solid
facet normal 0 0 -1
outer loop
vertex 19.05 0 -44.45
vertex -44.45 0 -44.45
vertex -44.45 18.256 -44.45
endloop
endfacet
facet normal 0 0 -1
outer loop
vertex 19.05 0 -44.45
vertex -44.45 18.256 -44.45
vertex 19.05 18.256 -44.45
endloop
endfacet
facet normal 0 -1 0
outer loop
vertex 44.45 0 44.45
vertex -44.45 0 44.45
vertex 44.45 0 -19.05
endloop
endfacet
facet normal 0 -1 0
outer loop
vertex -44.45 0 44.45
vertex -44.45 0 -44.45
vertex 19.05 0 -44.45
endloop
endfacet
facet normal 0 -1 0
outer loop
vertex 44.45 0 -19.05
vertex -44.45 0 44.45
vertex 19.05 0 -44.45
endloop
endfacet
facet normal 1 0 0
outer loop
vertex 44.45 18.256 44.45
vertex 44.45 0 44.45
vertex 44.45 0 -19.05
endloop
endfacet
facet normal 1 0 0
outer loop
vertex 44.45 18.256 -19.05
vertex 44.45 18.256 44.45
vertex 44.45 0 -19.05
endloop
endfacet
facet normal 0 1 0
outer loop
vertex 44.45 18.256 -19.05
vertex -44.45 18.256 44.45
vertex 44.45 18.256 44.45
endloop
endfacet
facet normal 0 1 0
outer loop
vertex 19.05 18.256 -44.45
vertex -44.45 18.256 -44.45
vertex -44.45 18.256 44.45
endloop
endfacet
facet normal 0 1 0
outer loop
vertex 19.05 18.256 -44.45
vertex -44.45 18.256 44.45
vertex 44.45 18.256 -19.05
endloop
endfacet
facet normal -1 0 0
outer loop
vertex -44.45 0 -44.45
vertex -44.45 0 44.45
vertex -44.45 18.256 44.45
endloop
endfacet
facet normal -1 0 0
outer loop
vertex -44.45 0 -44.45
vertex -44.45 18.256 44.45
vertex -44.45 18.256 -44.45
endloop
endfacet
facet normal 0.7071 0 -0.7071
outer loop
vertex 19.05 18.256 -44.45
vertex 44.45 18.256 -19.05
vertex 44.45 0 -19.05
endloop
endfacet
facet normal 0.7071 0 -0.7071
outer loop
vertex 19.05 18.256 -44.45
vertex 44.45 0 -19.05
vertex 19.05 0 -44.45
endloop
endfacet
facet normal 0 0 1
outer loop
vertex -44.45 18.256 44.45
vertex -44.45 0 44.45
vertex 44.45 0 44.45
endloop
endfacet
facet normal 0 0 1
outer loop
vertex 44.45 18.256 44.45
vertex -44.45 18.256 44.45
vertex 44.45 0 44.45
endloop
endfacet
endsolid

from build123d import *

# Parameters (mm, degrees)
SKETCH1_W           = 88.9
SKETCH1_H           = 88.9
BOSS_EXTRUDE1_DEPTH = 18.25625
CUT_EXTRUDE1_DEPTH  = 66.459114446


with BuildPart() as part:
    # Sketch1 → Boss-Extrude1 (new body)
    with BuildSketch(Plane(origin=(0, 0, 0), x_dir=(1, 0, 0), z_dir=(0, 1, 0))):
        Rectangle(SKETCH1_W, SKETCH1_H)
    extrude(amount=BOSS_EXTRUDE1_DEPTH)

    # Sketch2 → Cut-Extrude1 (cut, through all)
    with BuildSketch(Plane(origin=(0, 18.25625, 0), x_dir=(1, 0, 0), z_dir=(0, 1, 0))):
        Polygon((44.45, 44.45), (44.45, 19.05), (19.05, 44.45), align=None)
    extrude(amount=-CUT_EXTRUDE1_DEPTH, mode=Mode.SUBTRACT)


solid = part.part
